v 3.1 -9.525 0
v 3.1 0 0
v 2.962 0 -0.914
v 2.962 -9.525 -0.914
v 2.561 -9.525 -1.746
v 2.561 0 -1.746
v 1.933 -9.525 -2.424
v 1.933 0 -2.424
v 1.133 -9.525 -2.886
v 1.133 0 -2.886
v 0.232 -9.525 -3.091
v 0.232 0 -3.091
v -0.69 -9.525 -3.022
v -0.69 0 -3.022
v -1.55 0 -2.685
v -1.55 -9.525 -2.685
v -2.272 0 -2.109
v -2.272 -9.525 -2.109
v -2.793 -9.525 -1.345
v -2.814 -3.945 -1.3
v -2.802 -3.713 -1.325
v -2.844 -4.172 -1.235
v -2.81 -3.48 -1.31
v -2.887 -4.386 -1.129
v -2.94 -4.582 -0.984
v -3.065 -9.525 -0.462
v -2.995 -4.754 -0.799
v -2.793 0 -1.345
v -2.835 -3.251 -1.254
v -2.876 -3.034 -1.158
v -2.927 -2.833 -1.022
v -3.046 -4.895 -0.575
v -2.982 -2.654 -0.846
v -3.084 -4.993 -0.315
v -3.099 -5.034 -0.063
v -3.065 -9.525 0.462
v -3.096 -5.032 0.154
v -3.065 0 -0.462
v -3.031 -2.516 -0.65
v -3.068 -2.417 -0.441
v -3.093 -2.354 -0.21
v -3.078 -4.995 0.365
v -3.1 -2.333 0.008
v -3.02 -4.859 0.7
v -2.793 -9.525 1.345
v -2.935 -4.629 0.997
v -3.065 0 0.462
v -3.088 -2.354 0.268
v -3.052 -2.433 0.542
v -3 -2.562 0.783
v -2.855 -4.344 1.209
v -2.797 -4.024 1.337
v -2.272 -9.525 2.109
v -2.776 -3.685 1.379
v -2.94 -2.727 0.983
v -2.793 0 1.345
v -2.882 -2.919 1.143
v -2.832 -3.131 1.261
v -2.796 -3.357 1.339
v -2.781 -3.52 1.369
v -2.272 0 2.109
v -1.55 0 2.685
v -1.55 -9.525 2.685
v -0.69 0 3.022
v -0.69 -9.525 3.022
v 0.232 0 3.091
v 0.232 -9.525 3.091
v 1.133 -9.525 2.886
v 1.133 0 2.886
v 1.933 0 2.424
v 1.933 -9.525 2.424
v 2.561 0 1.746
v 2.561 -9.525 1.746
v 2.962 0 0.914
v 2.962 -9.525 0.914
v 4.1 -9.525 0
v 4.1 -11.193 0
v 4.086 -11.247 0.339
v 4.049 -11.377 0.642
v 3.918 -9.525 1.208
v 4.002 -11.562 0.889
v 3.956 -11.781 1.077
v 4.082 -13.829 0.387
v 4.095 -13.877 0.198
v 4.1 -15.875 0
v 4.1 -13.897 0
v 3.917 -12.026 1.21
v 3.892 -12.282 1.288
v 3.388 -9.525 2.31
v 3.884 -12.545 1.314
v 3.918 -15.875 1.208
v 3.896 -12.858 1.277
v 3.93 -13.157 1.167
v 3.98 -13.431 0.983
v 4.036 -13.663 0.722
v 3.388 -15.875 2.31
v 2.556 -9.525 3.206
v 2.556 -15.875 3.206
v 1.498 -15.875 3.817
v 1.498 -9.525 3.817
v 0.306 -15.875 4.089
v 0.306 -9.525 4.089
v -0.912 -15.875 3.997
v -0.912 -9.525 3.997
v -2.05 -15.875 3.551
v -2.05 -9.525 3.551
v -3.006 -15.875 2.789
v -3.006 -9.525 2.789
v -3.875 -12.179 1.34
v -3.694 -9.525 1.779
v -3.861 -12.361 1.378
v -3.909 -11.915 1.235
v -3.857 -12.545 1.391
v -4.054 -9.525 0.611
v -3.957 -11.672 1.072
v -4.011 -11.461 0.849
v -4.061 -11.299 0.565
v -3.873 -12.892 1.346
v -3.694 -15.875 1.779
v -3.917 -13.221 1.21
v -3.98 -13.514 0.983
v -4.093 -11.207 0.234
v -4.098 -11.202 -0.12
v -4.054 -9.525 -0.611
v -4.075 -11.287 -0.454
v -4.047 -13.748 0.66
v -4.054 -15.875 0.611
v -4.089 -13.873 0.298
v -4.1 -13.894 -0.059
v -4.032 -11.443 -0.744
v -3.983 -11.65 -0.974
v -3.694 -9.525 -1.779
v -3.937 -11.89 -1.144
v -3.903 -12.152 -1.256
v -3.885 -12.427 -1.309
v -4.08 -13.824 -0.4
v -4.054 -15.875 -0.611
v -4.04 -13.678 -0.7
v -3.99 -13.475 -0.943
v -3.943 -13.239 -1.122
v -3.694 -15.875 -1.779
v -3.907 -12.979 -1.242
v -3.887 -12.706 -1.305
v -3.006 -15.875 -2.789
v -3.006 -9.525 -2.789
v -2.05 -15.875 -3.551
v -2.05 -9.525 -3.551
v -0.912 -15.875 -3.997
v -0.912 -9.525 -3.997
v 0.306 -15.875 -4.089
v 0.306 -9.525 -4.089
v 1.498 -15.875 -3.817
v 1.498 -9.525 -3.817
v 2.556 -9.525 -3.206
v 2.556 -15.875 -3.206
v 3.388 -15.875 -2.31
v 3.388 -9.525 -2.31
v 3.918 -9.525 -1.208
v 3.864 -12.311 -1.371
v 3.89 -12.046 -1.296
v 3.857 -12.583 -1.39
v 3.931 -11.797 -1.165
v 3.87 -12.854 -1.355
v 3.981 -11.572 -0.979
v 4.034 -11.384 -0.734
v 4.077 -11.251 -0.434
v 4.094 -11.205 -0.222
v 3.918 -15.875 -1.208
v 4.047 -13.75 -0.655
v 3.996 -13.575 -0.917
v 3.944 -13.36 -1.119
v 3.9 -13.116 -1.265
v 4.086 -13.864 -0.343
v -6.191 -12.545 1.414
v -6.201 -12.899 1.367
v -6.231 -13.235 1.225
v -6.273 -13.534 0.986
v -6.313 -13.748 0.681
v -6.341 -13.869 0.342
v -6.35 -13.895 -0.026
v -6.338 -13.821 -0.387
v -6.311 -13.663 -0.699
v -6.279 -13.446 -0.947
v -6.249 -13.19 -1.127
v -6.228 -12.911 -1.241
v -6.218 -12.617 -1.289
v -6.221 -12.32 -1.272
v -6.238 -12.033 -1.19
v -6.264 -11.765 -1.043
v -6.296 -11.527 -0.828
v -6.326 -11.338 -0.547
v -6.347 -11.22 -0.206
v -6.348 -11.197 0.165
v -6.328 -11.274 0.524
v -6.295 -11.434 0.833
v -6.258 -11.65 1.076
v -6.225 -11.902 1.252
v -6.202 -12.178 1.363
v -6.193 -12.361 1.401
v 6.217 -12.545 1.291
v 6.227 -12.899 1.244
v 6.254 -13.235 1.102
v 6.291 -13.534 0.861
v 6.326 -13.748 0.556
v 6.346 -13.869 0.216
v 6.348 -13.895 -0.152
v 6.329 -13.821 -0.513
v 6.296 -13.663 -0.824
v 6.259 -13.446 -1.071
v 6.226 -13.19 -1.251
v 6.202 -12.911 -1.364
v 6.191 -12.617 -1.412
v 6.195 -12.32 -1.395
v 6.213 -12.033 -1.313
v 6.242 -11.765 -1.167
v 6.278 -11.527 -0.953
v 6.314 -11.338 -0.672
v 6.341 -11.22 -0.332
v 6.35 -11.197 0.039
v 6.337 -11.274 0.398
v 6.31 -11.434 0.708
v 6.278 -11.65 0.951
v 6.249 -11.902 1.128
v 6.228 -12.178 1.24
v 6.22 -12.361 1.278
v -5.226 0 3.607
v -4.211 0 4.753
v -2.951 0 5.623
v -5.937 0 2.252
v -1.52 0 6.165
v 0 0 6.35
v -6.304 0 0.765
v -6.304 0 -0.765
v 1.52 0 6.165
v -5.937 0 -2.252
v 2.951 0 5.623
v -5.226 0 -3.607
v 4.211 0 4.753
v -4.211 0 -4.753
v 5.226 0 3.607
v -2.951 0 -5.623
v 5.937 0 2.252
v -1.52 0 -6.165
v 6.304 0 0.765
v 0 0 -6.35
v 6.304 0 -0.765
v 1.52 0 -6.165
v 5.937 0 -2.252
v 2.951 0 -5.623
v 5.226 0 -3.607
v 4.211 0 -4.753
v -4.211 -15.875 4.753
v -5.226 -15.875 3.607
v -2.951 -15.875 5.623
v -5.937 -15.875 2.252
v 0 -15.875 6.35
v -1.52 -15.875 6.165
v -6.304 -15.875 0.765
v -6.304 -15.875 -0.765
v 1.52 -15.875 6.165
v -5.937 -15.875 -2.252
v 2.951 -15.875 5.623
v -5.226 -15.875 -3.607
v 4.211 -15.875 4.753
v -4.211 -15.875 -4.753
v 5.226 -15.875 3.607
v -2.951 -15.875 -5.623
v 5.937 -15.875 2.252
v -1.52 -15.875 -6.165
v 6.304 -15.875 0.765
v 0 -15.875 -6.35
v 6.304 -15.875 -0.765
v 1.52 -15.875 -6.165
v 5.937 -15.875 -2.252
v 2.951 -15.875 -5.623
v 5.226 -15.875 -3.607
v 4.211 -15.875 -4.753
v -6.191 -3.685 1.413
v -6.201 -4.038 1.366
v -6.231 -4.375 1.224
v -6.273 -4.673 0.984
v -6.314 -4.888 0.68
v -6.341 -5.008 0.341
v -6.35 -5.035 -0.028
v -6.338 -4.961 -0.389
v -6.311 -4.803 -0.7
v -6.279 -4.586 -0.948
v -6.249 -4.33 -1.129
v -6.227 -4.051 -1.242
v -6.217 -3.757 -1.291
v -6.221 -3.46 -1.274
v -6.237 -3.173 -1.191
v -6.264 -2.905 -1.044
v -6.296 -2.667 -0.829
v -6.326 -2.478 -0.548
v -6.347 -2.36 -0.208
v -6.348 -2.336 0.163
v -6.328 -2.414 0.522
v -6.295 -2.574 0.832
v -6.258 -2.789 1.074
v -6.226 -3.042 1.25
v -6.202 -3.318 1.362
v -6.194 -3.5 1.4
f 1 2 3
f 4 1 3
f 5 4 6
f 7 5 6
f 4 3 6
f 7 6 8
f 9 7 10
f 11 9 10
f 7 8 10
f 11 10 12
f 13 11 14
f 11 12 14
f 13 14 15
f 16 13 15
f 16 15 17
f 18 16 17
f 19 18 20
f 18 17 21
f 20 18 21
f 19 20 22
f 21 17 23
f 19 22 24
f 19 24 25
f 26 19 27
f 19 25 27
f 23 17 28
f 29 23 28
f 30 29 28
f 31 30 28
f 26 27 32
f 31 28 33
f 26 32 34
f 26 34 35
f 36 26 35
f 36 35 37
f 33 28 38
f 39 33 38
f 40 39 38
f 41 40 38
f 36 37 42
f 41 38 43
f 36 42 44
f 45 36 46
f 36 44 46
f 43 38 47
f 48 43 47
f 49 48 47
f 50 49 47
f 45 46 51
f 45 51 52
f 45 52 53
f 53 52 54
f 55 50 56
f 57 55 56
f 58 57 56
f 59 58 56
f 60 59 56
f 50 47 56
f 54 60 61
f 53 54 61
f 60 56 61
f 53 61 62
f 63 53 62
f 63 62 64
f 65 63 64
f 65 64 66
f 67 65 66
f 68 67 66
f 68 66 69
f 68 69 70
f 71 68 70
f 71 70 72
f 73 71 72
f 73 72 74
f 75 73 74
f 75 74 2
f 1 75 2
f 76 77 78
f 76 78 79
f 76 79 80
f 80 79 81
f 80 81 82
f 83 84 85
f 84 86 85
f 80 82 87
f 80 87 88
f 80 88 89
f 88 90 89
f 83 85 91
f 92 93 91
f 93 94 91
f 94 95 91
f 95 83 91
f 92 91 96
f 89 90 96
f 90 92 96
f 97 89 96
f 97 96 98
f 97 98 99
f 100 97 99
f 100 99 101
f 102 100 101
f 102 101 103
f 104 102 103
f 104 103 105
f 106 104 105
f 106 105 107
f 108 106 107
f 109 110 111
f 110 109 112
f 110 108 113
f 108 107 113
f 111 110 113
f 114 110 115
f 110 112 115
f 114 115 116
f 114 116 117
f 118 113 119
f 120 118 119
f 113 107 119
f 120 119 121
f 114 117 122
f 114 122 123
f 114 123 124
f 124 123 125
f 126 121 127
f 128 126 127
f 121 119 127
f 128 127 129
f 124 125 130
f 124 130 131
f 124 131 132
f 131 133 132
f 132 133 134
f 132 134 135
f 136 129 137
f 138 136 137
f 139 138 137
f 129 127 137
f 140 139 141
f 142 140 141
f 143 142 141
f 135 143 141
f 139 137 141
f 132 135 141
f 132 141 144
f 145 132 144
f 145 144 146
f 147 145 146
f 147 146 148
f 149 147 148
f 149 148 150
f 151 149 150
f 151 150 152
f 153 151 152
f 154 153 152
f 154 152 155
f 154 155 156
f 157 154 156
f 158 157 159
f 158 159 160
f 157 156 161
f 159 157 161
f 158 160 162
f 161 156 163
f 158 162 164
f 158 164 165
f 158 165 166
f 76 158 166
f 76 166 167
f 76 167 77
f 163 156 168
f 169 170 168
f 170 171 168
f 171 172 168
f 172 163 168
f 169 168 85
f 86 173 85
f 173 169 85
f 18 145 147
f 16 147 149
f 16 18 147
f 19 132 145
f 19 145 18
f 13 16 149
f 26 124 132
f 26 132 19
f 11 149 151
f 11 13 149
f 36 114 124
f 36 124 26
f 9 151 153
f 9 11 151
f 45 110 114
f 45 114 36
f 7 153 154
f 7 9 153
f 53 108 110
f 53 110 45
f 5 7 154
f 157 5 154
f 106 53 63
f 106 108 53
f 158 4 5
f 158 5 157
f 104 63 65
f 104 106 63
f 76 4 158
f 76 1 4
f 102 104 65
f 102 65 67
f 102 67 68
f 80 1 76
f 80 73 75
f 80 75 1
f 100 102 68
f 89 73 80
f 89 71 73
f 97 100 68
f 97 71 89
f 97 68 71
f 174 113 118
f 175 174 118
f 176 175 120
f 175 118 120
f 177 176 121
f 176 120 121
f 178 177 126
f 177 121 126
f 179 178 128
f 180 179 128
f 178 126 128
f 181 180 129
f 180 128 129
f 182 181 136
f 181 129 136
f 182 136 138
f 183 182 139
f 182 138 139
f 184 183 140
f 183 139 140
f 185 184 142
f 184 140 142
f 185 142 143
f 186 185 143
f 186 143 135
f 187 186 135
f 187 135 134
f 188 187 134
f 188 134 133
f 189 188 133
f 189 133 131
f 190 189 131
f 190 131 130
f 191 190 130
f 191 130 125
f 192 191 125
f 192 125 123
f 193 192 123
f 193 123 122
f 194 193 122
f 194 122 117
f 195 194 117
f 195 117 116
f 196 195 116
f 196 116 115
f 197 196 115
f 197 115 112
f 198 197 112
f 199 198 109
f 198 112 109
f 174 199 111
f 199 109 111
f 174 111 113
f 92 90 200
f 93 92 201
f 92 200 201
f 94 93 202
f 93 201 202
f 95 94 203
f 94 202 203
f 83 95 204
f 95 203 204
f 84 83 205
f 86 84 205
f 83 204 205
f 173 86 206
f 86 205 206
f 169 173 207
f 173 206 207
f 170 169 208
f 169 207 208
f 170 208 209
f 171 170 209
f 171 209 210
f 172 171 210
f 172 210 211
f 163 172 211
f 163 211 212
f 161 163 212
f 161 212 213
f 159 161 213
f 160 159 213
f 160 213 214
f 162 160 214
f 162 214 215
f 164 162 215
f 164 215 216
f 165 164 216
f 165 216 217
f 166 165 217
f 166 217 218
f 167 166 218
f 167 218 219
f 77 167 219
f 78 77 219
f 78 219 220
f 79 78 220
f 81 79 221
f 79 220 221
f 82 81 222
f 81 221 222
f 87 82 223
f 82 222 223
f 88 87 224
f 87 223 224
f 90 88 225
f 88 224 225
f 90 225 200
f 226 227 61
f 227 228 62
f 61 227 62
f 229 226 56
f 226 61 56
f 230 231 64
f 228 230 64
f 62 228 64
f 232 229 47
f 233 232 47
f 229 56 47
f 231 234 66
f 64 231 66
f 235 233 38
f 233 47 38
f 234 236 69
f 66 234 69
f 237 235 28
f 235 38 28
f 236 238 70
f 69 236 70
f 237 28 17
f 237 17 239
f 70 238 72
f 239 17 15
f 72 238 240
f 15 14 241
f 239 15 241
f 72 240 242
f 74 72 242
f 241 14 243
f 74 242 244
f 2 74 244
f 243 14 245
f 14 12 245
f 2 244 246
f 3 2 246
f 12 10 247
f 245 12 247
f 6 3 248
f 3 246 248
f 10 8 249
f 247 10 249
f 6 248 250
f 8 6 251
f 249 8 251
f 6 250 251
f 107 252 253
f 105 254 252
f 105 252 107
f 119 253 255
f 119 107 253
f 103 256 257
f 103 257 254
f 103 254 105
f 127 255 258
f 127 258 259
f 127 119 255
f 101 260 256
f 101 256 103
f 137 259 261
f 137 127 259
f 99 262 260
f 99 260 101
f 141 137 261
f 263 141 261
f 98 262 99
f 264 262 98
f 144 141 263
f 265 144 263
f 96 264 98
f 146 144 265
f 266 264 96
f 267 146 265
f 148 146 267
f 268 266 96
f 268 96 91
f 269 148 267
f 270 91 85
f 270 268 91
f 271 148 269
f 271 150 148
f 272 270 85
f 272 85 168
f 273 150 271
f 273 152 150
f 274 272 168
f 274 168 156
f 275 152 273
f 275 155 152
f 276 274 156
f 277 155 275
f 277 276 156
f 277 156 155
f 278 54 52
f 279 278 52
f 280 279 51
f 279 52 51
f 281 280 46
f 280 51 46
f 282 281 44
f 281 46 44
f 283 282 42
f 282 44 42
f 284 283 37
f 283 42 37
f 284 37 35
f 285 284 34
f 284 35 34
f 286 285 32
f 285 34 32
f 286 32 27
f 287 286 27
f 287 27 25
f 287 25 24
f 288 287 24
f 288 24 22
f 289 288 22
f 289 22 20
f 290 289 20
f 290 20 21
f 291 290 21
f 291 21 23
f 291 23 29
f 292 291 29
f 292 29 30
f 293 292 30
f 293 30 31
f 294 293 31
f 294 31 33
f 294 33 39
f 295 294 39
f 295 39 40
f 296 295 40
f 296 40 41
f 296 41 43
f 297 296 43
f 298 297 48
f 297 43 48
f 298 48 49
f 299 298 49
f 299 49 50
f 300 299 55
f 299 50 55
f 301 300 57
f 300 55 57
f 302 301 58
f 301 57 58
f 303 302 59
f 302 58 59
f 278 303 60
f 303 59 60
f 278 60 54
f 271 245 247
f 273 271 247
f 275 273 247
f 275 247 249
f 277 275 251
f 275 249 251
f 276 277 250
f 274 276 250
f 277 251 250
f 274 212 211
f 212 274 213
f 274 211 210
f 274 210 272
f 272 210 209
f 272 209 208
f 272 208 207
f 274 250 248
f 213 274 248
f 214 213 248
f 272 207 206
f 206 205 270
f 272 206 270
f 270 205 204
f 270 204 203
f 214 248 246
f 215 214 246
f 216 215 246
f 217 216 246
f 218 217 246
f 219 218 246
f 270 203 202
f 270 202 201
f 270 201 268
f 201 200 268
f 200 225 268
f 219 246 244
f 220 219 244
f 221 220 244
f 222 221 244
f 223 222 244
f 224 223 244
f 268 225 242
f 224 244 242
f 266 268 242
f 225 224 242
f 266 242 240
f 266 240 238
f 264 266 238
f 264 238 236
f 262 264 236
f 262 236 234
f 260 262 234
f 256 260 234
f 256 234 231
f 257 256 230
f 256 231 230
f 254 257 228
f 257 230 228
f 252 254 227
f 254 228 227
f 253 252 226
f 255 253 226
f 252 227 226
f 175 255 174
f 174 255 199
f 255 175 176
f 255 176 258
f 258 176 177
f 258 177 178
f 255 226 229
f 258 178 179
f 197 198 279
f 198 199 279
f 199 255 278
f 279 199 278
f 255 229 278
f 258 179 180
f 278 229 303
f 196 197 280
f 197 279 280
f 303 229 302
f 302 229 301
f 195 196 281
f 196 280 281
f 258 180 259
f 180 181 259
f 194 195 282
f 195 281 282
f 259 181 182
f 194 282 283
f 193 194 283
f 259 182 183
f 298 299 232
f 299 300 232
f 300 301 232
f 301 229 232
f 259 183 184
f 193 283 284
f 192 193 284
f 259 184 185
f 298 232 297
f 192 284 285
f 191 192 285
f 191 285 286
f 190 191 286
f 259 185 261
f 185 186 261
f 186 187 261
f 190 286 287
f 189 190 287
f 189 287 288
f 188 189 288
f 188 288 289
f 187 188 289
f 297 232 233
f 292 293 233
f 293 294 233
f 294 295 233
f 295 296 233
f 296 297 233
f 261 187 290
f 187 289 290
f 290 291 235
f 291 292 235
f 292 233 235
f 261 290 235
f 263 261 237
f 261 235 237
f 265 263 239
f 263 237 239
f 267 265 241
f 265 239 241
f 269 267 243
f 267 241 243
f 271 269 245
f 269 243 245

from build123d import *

# Parameters (mm, degrees)
SKETCH1_R                 = 6.35
BOSS_EXTRUDE1_DEPTH       = 15.875
SKETCH2_R                 = 3.1
CUT_EXTRUDE1_DEPTH        = 9.525
SKETCH3_R                 = 4.1
CUT_EXTRUDE2_DEPTH        = 6.35
F_6_32_TAPPED_HOLE1_D     = 2.7051
F_6_32_TAPPED_HOLE1_DEPTH = 7
F_6_32_TAPPED_HOLE1_TIP   = 0.81269403
F_6_32_TAPPED_HOLE2_D     = 2.7051


with BuildPart() as part:
    # Sketch1 → Boss-Extrude1 (new body)
    with BuildSketch(Plane(origin=(0, 0, 0), x_dir=(0, 0, -1), z_dir=(0, -1, 0))):
        Circle(SKETCH1_R)
    extrude(amount=BOSS_EXTRUDE1_DEPTH)

    # Sketch2 → Cut-Extrude1 (cut)
    with BuildSketch(Plane(origin=(0, 0, 0), x_dir=(1, 0, 0), z_dir=(0, 1, 0))):
        Circle(SKETCH2_R)
    extrude(amount=-CUT_EXTRUDE1_DEPTH, mode=Mode.SUBTRACT)

    # Sketch3 → Cut-Extrude2 (cut)
    with BuildSketch(Plane.XZ.offset(15.875)):
        Circle(SKETCH3_R)
    extrude(amount=-CUT_EXTRUDE2_DEPTH, mode=Mode.SUBTRACT)

    # #6-32 Tapped Hole1
    with Locations(Plane(origin=(-6.349702391, -3.685069286, 0.061478042), x_dir=(-0.009681581, 0, -0.999953132), z_dir=(-0.999953132, 0, 0.009681581))):
        with Locations((0, 0)):
            Hole(F_6_32_TAPPED_HOLE1_D / 2, depth=F_6_32_TAPPED_HOLE1_DEPTH)
            with Locations((0, 0, -(F_6_32_TAPPED_HOLE1_DEPTH + F_6_32_TAPPED_HOLE1_TIP / 2))):  # 118° drill point
                Cone(0, F_6_32_TAPPED_HOLE1_D / 2, F_6_32_TAPPED_HOLE1_TIP, mode=Mode.SUBTRACT)

    # #6-32 Tapped Hole2 (through all)
    with Locations(Plane(origin=(-6.349688123, -12.545322132, 0.062934409), x_dir=(-0.009910931, 0, -0.999950886), z_dir=(-0.999950886, 0, 0.009910931))):
        with Locations((0, 0)):
            Hole(F_6_32_TAPPED_HOLE2_D / 2)


solid = part.part
